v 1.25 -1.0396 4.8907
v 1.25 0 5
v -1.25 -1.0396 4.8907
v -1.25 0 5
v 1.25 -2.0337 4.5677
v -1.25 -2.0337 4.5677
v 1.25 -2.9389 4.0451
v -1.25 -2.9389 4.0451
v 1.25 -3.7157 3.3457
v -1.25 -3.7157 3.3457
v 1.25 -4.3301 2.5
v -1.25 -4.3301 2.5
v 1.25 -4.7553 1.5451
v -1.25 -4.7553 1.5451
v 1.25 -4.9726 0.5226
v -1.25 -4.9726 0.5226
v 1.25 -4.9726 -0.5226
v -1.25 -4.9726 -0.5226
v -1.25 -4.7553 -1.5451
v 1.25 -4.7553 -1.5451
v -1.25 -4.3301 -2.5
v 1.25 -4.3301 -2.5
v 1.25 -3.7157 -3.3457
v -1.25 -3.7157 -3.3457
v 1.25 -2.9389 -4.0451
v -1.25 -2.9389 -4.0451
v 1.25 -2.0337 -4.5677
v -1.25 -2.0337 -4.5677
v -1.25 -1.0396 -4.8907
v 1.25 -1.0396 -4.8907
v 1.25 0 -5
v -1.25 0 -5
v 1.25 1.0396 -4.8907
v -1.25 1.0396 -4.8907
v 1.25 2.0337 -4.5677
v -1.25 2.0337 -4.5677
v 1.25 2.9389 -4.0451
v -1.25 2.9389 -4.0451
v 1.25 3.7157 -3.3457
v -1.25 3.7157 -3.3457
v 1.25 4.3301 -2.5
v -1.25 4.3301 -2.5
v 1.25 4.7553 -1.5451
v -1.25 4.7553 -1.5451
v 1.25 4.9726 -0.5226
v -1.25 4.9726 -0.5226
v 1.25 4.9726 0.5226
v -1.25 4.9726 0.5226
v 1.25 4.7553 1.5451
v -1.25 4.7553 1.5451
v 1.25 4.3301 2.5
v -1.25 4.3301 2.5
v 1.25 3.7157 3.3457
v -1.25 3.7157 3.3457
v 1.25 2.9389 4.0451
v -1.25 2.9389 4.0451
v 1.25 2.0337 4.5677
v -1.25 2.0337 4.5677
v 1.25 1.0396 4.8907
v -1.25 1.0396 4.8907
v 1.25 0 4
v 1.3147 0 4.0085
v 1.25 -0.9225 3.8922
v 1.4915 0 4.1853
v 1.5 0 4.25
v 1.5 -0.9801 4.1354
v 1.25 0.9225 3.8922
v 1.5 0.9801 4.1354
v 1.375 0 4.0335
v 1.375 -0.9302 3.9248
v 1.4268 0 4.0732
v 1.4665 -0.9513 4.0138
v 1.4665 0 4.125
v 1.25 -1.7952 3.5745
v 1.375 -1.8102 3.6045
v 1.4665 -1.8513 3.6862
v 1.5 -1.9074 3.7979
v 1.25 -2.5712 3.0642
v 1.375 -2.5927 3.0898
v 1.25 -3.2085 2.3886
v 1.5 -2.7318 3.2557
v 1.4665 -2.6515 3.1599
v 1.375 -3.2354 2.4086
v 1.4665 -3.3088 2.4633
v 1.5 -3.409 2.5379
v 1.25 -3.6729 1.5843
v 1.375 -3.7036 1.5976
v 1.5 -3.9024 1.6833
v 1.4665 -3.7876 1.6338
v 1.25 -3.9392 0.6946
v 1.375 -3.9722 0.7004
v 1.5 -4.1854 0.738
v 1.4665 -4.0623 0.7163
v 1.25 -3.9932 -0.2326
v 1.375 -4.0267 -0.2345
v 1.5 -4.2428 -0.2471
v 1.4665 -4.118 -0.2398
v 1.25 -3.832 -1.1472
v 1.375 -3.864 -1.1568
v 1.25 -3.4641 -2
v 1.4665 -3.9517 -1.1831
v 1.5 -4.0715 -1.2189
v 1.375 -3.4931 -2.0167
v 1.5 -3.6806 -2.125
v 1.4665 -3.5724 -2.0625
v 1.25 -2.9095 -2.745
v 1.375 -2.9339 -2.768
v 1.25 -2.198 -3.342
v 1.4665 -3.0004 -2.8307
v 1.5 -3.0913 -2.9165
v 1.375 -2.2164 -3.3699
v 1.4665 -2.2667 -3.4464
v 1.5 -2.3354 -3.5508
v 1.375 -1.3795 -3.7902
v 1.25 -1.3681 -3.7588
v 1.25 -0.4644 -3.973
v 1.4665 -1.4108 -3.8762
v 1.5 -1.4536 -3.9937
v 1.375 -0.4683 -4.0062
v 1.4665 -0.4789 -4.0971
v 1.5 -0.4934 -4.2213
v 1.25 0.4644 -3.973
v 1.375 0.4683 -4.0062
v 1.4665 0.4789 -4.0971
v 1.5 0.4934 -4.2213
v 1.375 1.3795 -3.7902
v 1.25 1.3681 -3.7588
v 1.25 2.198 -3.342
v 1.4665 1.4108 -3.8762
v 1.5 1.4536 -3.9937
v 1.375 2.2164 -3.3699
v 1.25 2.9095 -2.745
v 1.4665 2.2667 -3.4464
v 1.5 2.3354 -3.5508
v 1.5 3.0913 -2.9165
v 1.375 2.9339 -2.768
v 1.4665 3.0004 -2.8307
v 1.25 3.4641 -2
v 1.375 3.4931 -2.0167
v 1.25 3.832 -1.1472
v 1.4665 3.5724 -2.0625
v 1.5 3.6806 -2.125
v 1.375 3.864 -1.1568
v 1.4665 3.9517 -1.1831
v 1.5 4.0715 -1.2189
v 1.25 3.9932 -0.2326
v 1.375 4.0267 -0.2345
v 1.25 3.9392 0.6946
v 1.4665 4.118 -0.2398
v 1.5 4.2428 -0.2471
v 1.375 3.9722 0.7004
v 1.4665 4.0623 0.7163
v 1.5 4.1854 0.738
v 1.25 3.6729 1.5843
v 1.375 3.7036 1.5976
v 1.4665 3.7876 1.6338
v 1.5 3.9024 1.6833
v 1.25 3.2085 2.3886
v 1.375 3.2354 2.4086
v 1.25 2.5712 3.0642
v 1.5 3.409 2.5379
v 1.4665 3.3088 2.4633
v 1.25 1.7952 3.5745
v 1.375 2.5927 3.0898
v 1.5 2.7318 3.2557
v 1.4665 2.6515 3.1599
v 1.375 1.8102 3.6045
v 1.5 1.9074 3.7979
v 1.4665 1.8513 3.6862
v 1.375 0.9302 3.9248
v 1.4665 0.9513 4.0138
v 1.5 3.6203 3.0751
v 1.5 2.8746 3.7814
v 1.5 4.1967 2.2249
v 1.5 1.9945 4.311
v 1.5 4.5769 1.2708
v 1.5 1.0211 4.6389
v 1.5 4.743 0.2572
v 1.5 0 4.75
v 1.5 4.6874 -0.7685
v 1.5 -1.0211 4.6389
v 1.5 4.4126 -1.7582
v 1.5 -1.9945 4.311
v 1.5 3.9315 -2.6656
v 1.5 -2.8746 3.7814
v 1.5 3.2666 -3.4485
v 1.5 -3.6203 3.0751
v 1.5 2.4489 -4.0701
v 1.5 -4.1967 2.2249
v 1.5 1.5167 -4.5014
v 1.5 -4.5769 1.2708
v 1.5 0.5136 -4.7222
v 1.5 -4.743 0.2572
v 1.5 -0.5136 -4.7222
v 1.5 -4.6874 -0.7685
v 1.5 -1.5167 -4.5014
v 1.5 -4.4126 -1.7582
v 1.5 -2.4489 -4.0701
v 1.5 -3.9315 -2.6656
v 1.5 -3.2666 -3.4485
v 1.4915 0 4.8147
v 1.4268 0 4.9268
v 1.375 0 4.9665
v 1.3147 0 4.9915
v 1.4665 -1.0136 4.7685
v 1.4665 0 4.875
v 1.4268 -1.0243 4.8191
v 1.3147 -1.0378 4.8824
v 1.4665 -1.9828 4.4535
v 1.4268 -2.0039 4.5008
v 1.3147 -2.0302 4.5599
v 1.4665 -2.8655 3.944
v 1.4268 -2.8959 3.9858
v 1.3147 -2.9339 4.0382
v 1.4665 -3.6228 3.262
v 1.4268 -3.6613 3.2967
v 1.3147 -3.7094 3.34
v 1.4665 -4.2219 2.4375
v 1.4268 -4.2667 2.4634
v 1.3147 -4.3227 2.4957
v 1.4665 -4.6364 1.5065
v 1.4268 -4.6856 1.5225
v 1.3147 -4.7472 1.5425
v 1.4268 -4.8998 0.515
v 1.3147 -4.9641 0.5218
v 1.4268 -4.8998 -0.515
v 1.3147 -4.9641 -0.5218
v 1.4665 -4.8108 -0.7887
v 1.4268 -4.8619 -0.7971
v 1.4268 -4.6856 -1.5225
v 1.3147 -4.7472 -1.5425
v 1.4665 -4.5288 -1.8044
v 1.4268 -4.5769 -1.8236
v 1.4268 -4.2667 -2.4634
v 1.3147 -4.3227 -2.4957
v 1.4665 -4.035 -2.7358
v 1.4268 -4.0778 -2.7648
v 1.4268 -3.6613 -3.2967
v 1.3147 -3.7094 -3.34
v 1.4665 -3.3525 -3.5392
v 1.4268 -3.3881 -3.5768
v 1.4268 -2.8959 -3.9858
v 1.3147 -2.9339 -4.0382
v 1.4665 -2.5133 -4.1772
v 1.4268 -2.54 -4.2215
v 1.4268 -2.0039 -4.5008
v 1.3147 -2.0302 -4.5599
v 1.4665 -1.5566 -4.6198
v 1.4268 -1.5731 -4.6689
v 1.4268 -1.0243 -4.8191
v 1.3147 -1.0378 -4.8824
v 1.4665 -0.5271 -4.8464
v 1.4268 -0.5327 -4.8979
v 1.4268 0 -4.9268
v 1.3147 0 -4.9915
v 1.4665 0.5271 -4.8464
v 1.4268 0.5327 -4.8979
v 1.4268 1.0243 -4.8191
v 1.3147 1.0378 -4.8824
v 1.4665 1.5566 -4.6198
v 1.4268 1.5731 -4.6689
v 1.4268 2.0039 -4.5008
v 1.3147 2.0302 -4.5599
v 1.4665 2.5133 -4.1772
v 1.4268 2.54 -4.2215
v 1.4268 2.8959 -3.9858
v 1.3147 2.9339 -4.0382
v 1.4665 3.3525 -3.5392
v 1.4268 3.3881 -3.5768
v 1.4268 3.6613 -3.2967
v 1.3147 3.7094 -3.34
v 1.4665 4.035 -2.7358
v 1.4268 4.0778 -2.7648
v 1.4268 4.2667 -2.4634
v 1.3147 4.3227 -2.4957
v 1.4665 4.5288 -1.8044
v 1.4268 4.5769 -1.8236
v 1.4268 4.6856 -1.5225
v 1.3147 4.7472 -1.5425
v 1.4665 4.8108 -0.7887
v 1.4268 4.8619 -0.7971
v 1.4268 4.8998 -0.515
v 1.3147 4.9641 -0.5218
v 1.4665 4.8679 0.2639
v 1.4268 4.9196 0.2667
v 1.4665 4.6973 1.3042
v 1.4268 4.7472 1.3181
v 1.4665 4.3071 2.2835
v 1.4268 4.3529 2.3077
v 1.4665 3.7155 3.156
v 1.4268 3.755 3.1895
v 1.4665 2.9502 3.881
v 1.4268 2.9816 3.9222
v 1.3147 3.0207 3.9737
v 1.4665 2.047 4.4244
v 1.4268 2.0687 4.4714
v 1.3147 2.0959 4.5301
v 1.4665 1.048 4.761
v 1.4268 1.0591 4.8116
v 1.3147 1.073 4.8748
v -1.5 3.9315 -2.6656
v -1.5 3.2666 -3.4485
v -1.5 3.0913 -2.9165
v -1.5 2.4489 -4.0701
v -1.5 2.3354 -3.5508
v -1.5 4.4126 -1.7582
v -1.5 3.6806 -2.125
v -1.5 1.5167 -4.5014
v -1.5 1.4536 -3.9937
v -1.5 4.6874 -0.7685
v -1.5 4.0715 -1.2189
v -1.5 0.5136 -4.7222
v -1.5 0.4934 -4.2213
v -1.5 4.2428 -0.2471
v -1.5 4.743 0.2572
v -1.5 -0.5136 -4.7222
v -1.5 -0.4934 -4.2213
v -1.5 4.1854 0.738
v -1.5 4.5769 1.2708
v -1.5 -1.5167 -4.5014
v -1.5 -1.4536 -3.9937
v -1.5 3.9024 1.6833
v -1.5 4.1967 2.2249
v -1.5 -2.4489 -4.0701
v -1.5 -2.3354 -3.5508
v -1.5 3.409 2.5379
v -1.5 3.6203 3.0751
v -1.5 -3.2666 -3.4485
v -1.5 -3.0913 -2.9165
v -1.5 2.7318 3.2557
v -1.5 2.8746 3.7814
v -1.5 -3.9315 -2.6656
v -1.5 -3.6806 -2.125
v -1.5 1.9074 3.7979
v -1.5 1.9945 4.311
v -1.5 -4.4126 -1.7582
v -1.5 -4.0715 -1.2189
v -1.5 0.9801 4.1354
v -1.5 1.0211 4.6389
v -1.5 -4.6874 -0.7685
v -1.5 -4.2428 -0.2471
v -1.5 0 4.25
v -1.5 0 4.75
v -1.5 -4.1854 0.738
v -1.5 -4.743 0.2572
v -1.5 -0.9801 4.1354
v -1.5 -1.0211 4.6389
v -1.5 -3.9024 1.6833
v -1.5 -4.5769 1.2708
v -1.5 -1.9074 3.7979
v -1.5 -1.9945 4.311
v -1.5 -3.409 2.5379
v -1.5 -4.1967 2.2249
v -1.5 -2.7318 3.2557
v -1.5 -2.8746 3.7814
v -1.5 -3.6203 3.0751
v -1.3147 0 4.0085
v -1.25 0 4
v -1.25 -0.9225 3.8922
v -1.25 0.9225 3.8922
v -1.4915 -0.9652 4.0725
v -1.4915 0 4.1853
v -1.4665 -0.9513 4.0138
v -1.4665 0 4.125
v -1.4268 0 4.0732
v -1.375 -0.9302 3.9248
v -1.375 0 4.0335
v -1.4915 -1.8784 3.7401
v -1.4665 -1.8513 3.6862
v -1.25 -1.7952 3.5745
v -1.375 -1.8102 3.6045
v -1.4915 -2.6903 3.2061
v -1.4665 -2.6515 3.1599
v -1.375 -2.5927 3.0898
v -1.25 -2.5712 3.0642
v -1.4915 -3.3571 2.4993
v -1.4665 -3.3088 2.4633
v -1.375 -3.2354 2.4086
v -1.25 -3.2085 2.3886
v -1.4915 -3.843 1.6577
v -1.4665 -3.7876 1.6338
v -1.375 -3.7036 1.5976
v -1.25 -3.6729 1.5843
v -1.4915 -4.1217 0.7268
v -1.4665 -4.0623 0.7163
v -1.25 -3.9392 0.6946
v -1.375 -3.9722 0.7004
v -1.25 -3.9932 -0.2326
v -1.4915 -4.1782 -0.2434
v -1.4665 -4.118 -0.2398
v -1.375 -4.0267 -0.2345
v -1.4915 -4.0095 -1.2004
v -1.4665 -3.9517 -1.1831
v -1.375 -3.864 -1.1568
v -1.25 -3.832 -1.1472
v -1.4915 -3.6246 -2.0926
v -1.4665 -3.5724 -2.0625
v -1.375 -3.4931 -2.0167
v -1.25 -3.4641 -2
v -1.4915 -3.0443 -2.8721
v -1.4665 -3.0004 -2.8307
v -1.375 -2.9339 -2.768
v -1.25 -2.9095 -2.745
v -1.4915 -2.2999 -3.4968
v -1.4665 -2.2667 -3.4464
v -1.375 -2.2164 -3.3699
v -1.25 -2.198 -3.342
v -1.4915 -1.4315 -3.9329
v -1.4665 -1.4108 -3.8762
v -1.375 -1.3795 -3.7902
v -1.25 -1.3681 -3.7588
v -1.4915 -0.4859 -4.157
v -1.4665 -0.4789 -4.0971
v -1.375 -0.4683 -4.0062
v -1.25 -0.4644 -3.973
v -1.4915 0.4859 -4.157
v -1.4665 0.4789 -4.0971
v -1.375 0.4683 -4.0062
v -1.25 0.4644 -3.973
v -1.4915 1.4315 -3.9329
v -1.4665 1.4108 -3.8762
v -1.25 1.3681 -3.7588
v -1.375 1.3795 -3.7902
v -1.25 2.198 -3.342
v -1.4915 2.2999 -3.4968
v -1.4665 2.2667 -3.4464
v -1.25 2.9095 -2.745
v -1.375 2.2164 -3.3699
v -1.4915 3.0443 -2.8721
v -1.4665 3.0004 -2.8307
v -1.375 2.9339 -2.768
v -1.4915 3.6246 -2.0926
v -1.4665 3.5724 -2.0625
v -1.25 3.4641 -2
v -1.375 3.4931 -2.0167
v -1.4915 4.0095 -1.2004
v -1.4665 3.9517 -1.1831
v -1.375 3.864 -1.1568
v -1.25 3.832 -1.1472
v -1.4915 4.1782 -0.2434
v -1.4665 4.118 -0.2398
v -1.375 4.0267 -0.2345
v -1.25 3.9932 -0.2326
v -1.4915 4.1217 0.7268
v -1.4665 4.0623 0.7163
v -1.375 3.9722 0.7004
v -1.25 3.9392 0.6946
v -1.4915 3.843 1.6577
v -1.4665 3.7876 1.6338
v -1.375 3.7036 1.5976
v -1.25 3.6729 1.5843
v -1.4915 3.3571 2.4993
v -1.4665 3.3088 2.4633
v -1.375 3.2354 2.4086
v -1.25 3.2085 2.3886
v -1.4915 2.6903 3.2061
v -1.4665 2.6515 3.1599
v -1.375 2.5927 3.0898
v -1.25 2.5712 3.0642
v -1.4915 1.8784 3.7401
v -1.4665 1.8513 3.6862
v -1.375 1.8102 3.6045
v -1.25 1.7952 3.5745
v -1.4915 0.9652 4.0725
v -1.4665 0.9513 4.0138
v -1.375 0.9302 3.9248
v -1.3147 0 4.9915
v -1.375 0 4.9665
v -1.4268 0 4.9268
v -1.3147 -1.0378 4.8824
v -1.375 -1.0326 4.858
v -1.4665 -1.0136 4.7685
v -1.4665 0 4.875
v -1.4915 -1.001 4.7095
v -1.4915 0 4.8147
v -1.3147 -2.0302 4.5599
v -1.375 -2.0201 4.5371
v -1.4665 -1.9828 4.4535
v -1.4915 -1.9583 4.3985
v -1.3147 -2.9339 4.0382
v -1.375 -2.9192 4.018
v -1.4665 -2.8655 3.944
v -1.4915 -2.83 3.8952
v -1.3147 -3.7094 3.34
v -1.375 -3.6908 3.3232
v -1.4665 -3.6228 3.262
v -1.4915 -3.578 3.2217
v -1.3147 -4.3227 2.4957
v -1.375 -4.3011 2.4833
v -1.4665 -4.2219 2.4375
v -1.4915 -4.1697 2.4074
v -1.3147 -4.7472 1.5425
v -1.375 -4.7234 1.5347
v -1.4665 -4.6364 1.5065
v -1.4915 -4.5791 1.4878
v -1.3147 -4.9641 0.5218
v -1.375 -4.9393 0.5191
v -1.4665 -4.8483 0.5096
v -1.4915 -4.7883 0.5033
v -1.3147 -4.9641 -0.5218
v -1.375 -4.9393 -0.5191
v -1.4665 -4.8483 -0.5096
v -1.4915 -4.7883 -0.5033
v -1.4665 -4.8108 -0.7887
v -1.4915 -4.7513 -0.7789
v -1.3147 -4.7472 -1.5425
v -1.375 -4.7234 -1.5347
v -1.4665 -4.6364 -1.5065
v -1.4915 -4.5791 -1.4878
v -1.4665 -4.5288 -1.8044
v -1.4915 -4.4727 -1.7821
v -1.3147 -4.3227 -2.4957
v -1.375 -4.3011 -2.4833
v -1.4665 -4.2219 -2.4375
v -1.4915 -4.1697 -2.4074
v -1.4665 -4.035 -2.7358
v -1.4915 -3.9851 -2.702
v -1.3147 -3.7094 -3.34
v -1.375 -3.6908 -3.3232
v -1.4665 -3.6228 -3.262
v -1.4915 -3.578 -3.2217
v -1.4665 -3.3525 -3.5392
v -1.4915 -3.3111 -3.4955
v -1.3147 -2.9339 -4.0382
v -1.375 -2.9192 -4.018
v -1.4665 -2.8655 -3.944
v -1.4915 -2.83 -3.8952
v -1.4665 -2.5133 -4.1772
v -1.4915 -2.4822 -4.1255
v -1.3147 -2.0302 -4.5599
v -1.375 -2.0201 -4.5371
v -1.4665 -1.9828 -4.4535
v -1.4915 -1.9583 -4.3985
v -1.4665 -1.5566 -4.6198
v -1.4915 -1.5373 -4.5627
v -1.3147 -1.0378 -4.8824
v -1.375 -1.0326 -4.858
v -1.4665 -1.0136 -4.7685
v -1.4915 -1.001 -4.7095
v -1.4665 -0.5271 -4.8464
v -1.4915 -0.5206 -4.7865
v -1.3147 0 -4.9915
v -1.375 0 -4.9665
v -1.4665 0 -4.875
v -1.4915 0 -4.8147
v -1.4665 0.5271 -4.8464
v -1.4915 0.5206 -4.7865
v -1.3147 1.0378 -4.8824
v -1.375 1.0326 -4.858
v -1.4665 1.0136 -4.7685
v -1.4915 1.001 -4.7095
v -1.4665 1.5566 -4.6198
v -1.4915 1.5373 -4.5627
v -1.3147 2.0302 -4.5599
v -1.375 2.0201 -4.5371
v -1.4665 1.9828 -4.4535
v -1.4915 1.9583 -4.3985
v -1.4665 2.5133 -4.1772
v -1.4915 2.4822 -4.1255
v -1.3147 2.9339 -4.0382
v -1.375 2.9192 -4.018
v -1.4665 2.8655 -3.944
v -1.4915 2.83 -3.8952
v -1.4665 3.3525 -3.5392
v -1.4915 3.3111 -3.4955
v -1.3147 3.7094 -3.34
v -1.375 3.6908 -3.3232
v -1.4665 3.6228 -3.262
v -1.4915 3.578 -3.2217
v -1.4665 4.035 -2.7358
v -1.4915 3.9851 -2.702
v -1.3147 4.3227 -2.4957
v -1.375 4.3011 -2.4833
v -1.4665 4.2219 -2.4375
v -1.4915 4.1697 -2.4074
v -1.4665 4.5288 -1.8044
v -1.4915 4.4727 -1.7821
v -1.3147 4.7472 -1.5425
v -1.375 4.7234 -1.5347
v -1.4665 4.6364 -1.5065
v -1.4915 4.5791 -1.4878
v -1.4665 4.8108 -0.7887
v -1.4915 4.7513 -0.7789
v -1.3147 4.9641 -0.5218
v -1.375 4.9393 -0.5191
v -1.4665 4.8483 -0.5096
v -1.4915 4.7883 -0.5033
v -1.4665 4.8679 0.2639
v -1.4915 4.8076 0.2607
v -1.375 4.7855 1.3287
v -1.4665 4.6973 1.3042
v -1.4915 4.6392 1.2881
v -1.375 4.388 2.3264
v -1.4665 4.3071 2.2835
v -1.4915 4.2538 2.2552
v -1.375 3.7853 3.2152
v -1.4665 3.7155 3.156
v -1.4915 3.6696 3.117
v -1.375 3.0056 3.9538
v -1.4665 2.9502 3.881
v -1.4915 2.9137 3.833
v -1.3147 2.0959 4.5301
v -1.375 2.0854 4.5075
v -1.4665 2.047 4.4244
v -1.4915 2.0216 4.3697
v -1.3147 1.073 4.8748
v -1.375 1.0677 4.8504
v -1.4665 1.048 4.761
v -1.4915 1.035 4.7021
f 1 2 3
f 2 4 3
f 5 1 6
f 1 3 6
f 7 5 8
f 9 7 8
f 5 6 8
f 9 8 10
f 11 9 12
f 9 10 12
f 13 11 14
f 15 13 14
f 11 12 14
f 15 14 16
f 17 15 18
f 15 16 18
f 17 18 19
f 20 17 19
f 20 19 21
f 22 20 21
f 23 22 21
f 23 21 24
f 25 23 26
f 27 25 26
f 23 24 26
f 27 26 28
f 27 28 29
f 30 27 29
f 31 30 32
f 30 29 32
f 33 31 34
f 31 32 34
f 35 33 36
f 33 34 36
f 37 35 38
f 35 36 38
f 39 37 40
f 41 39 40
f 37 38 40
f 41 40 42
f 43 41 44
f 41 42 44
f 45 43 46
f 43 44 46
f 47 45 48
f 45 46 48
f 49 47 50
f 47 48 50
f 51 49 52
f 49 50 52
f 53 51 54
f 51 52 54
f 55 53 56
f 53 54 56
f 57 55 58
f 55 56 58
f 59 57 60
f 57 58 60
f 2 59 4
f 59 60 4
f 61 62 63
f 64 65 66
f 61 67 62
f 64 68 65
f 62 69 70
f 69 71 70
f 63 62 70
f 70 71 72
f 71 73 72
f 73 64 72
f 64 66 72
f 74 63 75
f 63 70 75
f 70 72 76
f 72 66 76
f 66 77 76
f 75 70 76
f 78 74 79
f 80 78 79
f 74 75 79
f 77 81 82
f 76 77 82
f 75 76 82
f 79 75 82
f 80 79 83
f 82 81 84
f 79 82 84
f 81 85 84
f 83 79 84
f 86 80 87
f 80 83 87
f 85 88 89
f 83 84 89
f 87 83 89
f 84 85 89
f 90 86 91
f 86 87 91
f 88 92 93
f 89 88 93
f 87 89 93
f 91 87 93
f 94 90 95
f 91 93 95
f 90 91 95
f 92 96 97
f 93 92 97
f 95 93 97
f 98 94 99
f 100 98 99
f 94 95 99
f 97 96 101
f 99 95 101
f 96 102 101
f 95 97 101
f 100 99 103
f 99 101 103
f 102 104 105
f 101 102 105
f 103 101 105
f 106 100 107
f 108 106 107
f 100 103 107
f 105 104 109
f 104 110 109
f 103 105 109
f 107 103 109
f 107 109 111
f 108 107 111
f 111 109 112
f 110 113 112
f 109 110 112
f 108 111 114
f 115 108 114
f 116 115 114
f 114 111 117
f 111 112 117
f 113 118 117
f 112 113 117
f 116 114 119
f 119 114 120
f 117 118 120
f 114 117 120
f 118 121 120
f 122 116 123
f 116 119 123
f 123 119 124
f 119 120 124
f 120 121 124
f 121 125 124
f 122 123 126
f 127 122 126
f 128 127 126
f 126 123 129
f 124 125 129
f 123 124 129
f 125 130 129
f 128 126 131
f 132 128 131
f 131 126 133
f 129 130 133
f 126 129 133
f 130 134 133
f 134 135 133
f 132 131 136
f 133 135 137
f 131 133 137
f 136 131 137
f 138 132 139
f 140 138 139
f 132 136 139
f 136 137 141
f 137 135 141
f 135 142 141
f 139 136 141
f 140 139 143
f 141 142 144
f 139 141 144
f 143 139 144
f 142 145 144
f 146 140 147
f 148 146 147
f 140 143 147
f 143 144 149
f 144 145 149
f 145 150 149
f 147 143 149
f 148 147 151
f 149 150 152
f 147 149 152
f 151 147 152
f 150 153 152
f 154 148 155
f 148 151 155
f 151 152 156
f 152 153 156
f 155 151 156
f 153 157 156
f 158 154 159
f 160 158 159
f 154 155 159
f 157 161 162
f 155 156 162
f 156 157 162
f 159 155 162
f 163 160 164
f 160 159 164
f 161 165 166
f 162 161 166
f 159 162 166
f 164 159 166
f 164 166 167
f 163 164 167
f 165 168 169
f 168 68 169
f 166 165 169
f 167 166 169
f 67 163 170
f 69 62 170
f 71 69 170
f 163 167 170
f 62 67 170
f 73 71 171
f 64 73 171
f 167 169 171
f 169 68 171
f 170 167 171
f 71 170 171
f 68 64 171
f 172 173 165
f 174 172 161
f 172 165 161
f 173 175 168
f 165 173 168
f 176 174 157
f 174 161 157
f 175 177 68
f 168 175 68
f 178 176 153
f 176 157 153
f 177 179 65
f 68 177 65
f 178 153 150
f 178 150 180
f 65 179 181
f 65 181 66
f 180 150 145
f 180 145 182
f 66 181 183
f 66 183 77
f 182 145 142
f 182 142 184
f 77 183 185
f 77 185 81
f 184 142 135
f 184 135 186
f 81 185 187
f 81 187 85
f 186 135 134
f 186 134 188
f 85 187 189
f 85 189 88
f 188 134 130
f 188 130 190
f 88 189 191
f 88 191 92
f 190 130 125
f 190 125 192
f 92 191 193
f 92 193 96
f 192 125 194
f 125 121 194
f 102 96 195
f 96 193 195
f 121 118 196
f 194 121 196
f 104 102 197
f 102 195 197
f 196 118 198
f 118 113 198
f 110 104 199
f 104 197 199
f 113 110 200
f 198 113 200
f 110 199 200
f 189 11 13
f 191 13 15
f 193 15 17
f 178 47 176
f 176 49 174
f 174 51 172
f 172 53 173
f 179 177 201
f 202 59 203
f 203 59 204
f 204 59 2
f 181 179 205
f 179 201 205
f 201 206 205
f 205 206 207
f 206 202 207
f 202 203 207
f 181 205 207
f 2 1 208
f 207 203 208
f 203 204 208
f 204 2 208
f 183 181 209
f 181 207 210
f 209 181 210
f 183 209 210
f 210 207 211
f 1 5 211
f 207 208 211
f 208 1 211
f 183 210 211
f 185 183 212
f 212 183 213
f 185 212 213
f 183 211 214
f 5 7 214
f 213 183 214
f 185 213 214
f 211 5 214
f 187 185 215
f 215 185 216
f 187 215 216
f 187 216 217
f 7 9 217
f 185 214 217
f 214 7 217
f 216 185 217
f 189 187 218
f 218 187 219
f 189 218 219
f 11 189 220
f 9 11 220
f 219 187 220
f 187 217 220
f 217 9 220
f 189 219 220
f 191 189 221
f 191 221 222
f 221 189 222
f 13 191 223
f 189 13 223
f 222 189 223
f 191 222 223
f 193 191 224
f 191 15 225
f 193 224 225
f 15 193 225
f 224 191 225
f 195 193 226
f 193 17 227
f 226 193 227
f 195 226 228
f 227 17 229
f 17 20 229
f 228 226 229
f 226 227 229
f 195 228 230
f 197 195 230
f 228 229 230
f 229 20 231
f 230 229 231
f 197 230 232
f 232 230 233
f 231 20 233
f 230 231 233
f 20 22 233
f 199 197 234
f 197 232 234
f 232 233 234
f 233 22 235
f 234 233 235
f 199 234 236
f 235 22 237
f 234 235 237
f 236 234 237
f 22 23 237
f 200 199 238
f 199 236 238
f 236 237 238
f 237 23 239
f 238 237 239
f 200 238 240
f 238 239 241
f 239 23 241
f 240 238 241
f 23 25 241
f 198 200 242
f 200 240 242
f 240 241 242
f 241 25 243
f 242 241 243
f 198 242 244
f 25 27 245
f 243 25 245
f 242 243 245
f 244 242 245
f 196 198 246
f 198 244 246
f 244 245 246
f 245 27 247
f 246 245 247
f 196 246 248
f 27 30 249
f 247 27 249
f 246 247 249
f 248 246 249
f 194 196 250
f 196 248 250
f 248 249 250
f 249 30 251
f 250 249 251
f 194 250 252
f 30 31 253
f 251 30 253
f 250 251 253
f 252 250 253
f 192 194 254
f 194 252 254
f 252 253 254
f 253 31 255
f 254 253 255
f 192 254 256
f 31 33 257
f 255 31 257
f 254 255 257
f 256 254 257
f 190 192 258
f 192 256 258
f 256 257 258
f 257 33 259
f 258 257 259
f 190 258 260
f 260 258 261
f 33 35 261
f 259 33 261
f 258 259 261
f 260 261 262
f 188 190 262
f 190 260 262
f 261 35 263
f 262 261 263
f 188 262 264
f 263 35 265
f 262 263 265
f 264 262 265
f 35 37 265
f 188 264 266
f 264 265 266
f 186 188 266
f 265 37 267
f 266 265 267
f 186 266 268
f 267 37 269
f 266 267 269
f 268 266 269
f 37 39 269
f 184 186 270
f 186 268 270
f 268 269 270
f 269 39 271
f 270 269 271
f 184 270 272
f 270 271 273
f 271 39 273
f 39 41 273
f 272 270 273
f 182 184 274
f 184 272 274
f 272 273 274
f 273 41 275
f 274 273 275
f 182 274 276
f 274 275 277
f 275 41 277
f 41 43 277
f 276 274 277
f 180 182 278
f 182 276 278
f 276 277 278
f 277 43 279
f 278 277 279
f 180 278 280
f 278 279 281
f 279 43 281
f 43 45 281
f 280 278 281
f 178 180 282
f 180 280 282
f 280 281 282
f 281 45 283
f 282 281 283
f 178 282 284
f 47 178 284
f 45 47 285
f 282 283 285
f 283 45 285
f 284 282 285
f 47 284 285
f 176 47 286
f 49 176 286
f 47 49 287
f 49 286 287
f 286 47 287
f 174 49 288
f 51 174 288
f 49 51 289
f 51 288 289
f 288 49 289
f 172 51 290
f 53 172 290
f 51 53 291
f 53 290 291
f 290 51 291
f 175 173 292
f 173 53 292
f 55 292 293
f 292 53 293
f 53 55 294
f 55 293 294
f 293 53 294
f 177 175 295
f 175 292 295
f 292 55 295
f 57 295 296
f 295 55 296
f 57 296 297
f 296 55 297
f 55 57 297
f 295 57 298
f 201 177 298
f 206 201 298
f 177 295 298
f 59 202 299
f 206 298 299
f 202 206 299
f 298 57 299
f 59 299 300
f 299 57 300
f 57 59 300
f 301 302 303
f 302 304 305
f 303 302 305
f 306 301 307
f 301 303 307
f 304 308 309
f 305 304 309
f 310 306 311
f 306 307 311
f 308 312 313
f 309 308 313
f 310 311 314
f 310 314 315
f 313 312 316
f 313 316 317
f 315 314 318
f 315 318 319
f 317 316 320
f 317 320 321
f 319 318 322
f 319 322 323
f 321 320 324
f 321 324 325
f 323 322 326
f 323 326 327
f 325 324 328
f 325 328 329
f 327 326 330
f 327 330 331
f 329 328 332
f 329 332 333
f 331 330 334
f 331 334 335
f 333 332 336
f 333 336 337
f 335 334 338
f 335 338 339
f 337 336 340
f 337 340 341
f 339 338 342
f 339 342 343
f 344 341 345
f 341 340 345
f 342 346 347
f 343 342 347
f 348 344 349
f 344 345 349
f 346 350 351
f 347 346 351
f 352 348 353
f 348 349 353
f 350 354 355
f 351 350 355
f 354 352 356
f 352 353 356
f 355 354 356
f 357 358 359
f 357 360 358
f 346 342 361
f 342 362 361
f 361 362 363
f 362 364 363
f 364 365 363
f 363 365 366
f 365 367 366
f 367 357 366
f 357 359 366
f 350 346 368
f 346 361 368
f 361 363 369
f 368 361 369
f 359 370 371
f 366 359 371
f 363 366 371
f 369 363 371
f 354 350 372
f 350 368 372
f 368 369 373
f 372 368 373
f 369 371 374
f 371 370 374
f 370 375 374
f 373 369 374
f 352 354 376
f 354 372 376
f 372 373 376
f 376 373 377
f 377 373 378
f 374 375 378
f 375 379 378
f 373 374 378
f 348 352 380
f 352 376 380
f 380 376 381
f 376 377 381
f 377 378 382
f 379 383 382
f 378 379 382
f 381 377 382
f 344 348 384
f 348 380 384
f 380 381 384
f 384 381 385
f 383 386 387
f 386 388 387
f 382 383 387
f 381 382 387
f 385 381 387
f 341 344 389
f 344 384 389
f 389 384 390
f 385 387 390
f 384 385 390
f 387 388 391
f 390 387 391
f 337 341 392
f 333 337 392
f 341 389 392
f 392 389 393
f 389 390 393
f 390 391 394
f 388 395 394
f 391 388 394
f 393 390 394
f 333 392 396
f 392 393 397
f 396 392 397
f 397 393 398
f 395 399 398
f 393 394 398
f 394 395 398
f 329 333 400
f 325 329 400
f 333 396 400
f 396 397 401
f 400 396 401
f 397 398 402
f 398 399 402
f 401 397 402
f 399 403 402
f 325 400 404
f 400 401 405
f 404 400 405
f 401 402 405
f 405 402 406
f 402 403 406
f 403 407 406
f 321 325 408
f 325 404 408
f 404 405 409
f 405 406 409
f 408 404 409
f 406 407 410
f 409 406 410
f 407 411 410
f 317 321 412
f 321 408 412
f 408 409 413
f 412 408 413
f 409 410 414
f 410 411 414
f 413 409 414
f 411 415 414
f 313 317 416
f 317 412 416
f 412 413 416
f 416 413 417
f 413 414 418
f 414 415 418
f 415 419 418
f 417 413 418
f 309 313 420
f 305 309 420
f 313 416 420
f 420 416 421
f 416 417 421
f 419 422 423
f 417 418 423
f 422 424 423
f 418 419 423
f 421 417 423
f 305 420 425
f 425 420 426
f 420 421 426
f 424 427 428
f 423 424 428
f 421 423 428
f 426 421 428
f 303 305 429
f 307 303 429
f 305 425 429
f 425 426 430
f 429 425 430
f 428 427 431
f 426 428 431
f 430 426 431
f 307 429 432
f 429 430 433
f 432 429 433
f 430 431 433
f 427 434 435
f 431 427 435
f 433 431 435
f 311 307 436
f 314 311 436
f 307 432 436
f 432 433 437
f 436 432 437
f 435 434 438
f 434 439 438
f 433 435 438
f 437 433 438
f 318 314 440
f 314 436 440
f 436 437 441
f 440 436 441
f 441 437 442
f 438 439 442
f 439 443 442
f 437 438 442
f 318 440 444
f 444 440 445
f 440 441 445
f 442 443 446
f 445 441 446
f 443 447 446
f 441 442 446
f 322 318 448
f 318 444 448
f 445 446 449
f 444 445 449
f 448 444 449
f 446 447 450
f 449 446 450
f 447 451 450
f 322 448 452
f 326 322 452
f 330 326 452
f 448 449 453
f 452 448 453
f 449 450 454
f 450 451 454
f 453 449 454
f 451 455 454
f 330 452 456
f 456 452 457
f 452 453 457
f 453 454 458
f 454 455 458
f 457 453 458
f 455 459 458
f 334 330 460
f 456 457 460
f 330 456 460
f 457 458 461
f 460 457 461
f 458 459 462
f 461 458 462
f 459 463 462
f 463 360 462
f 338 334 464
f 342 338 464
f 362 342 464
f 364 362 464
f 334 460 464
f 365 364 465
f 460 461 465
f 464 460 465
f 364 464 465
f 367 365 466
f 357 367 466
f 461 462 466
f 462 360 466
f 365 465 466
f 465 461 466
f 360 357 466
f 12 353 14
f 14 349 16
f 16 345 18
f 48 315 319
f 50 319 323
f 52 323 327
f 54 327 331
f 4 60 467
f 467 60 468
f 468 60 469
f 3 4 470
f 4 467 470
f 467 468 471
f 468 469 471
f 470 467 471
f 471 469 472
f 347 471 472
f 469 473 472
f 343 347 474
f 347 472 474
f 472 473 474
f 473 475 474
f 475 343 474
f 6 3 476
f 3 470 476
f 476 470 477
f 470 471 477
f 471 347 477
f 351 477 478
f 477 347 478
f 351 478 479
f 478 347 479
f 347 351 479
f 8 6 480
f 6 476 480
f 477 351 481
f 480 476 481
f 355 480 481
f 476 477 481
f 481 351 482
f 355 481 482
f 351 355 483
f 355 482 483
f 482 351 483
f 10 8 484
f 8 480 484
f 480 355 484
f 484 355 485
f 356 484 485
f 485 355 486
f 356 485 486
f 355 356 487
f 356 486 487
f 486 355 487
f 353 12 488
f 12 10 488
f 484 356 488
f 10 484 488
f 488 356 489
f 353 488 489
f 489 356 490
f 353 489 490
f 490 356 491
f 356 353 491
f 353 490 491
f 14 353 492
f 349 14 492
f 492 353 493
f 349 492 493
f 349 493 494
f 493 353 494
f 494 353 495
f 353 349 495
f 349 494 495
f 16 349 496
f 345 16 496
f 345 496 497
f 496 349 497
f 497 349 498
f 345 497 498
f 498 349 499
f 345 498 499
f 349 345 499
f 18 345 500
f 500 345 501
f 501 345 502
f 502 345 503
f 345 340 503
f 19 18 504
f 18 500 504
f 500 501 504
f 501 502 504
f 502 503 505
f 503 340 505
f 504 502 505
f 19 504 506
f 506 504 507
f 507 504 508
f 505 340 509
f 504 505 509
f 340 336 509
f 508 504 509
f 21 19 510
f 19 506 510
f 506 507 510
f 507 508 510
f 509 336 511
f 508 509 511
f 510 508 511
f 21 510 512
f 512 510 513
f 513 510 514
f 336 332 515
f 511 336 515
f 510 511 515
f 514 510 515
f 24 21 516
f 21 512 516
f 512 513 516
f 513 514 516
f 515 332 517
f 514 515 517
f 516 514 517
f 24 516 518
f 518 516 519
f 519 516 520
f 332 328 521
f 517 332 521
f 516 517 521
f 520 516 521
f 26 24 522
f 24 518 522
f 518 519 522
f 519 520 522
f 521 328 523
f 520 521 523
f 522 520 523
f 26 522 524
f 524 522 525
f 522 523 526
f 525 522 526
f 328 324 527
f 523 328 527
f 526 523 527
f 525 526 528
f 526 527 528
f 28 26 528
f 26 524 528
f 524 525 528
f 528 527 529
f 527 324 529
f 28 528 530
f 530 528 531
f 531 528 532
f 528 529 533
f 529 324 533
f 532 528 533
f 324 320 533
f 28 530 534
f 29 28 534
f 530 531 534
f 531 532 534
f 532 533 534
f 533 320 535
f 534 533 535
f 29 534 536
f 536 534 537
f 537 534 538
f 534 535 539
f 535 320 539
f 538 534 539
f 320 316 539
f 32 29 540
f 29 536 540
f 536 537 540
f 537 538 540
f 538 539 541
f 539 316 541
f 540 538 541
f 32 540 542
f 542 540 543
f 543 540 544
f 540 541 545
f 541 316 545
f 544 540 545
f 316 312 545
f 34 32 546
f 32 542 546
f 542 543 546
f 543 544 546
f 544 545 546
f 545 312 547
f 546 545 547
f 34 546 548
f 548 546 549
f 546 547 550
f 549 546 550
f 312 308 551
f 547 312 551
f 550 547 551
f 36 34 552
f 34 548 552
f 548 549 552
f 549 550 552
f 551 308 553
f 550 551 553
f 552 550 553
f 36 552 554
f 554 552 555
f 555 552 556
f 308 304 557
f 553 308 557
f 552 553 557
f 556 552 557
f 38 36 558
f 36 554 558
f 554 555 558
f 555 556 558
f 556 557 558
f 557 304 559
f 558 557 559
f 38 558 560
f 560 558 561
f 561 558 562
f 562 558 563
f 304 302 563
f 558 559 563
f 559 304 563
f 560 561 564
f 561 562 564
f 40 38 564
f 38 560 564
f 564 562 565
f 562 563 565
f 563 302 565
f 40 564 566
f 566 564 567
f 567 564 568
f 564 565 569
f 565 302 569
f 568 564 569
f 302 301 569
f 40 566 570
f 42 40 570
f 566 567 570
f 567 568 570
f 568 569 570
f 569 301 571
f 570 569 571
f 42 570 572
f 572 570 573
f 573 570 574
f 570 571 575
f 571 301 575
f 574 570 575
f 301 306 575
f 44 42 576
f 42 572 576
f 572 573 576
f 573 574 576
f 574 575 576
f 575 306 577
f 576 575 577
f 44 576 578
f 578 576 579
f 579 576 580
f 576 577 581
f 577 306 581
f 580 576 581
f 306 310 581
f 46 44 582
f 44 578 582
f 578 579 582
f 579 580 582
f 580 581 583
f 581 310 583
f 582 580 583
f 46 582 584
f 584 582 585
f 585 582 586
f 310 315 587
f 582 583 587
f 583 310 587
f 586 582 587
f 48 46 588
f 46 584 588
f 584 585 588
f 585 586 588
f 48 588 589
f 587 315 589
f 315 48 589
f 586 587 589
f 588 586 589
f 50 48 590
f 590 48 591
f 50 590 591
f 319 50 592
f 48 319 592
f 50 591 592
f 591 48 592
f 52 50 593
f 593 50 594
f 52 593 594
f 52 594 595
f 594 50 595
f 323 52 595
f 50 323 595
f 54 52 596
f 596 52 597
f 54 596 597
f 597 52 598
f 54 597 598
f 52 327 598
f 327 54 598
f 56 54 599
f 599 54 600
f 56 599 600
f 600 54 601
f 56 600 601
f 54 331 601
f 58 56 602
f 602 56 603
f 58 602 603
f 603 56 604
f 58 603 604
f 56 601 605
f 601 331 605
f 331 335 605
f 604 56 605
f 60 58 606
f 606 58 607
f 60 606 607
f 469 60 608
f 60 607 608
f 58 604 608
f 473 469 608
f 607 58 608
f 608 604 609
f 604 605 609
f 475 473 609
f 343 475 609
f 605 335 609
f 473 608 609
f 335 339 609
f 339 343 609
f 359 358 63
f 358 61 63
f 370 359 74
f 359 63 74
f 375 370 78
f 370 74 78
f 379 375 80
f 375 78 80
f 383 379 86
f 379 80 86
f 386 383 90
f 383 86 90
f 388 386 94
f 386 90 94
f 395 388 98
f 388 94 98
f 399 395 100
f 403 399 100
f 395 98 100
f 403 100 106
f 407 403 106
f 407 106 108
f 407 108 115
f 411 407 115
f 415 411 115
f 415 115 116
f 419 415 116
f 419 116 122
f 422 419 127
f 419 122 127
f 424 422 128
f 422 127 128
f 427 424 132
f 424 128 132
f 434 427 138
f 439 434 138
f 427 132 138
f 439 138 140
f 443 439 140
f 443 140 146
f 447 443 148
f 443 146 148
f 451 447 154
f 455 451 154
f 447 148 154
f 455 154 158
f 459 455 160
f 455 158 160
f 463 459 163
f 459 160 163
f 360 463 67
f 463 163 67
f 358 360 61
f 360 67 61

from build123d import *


with BuildPart() as part:
    # Croquis1 → Revolución1 (revolve)
    with BuildSketch(Plane(origin=(0, 0, 0), x_dir=(1, 0, 0), z_dir=(0, 1, 0)), mode=Mode.PRIVATE) as revoluci_n1_sk:
        with BuildLine():
            Line((1.5, 4.25), (1.5, 4.75))
            ThreePointArc((1.5, 4.75), (1.426776695, 4.926776695), (1.25, 5))
            Line((1.25, 5), (-1.25, 5))
            ThreePointArc((-1.25, 5), (-1.426776695, 4.926776695), (-1.5, 4.75))
            Line((-1.5, 4.75), (-1.5, 4.25))
            ThreePointArc((-1.5, 4.25), (-1.426776695, 4.073223305), (-1.25, 4))
            Line((-1.25, 4), (1.25, 4))
            ThreePointArc((1.25, 4), (1.426776695, 4.073223305), (1.5, 4.25))
        make_face()
    revolve(revoluci_n1_sk.sketch.rotate(Axis((0, 0, 0), (1, 0, 0)), 180), axis=Axis((0, 0, 0), (1, 0, 0)))


solid = part.part
